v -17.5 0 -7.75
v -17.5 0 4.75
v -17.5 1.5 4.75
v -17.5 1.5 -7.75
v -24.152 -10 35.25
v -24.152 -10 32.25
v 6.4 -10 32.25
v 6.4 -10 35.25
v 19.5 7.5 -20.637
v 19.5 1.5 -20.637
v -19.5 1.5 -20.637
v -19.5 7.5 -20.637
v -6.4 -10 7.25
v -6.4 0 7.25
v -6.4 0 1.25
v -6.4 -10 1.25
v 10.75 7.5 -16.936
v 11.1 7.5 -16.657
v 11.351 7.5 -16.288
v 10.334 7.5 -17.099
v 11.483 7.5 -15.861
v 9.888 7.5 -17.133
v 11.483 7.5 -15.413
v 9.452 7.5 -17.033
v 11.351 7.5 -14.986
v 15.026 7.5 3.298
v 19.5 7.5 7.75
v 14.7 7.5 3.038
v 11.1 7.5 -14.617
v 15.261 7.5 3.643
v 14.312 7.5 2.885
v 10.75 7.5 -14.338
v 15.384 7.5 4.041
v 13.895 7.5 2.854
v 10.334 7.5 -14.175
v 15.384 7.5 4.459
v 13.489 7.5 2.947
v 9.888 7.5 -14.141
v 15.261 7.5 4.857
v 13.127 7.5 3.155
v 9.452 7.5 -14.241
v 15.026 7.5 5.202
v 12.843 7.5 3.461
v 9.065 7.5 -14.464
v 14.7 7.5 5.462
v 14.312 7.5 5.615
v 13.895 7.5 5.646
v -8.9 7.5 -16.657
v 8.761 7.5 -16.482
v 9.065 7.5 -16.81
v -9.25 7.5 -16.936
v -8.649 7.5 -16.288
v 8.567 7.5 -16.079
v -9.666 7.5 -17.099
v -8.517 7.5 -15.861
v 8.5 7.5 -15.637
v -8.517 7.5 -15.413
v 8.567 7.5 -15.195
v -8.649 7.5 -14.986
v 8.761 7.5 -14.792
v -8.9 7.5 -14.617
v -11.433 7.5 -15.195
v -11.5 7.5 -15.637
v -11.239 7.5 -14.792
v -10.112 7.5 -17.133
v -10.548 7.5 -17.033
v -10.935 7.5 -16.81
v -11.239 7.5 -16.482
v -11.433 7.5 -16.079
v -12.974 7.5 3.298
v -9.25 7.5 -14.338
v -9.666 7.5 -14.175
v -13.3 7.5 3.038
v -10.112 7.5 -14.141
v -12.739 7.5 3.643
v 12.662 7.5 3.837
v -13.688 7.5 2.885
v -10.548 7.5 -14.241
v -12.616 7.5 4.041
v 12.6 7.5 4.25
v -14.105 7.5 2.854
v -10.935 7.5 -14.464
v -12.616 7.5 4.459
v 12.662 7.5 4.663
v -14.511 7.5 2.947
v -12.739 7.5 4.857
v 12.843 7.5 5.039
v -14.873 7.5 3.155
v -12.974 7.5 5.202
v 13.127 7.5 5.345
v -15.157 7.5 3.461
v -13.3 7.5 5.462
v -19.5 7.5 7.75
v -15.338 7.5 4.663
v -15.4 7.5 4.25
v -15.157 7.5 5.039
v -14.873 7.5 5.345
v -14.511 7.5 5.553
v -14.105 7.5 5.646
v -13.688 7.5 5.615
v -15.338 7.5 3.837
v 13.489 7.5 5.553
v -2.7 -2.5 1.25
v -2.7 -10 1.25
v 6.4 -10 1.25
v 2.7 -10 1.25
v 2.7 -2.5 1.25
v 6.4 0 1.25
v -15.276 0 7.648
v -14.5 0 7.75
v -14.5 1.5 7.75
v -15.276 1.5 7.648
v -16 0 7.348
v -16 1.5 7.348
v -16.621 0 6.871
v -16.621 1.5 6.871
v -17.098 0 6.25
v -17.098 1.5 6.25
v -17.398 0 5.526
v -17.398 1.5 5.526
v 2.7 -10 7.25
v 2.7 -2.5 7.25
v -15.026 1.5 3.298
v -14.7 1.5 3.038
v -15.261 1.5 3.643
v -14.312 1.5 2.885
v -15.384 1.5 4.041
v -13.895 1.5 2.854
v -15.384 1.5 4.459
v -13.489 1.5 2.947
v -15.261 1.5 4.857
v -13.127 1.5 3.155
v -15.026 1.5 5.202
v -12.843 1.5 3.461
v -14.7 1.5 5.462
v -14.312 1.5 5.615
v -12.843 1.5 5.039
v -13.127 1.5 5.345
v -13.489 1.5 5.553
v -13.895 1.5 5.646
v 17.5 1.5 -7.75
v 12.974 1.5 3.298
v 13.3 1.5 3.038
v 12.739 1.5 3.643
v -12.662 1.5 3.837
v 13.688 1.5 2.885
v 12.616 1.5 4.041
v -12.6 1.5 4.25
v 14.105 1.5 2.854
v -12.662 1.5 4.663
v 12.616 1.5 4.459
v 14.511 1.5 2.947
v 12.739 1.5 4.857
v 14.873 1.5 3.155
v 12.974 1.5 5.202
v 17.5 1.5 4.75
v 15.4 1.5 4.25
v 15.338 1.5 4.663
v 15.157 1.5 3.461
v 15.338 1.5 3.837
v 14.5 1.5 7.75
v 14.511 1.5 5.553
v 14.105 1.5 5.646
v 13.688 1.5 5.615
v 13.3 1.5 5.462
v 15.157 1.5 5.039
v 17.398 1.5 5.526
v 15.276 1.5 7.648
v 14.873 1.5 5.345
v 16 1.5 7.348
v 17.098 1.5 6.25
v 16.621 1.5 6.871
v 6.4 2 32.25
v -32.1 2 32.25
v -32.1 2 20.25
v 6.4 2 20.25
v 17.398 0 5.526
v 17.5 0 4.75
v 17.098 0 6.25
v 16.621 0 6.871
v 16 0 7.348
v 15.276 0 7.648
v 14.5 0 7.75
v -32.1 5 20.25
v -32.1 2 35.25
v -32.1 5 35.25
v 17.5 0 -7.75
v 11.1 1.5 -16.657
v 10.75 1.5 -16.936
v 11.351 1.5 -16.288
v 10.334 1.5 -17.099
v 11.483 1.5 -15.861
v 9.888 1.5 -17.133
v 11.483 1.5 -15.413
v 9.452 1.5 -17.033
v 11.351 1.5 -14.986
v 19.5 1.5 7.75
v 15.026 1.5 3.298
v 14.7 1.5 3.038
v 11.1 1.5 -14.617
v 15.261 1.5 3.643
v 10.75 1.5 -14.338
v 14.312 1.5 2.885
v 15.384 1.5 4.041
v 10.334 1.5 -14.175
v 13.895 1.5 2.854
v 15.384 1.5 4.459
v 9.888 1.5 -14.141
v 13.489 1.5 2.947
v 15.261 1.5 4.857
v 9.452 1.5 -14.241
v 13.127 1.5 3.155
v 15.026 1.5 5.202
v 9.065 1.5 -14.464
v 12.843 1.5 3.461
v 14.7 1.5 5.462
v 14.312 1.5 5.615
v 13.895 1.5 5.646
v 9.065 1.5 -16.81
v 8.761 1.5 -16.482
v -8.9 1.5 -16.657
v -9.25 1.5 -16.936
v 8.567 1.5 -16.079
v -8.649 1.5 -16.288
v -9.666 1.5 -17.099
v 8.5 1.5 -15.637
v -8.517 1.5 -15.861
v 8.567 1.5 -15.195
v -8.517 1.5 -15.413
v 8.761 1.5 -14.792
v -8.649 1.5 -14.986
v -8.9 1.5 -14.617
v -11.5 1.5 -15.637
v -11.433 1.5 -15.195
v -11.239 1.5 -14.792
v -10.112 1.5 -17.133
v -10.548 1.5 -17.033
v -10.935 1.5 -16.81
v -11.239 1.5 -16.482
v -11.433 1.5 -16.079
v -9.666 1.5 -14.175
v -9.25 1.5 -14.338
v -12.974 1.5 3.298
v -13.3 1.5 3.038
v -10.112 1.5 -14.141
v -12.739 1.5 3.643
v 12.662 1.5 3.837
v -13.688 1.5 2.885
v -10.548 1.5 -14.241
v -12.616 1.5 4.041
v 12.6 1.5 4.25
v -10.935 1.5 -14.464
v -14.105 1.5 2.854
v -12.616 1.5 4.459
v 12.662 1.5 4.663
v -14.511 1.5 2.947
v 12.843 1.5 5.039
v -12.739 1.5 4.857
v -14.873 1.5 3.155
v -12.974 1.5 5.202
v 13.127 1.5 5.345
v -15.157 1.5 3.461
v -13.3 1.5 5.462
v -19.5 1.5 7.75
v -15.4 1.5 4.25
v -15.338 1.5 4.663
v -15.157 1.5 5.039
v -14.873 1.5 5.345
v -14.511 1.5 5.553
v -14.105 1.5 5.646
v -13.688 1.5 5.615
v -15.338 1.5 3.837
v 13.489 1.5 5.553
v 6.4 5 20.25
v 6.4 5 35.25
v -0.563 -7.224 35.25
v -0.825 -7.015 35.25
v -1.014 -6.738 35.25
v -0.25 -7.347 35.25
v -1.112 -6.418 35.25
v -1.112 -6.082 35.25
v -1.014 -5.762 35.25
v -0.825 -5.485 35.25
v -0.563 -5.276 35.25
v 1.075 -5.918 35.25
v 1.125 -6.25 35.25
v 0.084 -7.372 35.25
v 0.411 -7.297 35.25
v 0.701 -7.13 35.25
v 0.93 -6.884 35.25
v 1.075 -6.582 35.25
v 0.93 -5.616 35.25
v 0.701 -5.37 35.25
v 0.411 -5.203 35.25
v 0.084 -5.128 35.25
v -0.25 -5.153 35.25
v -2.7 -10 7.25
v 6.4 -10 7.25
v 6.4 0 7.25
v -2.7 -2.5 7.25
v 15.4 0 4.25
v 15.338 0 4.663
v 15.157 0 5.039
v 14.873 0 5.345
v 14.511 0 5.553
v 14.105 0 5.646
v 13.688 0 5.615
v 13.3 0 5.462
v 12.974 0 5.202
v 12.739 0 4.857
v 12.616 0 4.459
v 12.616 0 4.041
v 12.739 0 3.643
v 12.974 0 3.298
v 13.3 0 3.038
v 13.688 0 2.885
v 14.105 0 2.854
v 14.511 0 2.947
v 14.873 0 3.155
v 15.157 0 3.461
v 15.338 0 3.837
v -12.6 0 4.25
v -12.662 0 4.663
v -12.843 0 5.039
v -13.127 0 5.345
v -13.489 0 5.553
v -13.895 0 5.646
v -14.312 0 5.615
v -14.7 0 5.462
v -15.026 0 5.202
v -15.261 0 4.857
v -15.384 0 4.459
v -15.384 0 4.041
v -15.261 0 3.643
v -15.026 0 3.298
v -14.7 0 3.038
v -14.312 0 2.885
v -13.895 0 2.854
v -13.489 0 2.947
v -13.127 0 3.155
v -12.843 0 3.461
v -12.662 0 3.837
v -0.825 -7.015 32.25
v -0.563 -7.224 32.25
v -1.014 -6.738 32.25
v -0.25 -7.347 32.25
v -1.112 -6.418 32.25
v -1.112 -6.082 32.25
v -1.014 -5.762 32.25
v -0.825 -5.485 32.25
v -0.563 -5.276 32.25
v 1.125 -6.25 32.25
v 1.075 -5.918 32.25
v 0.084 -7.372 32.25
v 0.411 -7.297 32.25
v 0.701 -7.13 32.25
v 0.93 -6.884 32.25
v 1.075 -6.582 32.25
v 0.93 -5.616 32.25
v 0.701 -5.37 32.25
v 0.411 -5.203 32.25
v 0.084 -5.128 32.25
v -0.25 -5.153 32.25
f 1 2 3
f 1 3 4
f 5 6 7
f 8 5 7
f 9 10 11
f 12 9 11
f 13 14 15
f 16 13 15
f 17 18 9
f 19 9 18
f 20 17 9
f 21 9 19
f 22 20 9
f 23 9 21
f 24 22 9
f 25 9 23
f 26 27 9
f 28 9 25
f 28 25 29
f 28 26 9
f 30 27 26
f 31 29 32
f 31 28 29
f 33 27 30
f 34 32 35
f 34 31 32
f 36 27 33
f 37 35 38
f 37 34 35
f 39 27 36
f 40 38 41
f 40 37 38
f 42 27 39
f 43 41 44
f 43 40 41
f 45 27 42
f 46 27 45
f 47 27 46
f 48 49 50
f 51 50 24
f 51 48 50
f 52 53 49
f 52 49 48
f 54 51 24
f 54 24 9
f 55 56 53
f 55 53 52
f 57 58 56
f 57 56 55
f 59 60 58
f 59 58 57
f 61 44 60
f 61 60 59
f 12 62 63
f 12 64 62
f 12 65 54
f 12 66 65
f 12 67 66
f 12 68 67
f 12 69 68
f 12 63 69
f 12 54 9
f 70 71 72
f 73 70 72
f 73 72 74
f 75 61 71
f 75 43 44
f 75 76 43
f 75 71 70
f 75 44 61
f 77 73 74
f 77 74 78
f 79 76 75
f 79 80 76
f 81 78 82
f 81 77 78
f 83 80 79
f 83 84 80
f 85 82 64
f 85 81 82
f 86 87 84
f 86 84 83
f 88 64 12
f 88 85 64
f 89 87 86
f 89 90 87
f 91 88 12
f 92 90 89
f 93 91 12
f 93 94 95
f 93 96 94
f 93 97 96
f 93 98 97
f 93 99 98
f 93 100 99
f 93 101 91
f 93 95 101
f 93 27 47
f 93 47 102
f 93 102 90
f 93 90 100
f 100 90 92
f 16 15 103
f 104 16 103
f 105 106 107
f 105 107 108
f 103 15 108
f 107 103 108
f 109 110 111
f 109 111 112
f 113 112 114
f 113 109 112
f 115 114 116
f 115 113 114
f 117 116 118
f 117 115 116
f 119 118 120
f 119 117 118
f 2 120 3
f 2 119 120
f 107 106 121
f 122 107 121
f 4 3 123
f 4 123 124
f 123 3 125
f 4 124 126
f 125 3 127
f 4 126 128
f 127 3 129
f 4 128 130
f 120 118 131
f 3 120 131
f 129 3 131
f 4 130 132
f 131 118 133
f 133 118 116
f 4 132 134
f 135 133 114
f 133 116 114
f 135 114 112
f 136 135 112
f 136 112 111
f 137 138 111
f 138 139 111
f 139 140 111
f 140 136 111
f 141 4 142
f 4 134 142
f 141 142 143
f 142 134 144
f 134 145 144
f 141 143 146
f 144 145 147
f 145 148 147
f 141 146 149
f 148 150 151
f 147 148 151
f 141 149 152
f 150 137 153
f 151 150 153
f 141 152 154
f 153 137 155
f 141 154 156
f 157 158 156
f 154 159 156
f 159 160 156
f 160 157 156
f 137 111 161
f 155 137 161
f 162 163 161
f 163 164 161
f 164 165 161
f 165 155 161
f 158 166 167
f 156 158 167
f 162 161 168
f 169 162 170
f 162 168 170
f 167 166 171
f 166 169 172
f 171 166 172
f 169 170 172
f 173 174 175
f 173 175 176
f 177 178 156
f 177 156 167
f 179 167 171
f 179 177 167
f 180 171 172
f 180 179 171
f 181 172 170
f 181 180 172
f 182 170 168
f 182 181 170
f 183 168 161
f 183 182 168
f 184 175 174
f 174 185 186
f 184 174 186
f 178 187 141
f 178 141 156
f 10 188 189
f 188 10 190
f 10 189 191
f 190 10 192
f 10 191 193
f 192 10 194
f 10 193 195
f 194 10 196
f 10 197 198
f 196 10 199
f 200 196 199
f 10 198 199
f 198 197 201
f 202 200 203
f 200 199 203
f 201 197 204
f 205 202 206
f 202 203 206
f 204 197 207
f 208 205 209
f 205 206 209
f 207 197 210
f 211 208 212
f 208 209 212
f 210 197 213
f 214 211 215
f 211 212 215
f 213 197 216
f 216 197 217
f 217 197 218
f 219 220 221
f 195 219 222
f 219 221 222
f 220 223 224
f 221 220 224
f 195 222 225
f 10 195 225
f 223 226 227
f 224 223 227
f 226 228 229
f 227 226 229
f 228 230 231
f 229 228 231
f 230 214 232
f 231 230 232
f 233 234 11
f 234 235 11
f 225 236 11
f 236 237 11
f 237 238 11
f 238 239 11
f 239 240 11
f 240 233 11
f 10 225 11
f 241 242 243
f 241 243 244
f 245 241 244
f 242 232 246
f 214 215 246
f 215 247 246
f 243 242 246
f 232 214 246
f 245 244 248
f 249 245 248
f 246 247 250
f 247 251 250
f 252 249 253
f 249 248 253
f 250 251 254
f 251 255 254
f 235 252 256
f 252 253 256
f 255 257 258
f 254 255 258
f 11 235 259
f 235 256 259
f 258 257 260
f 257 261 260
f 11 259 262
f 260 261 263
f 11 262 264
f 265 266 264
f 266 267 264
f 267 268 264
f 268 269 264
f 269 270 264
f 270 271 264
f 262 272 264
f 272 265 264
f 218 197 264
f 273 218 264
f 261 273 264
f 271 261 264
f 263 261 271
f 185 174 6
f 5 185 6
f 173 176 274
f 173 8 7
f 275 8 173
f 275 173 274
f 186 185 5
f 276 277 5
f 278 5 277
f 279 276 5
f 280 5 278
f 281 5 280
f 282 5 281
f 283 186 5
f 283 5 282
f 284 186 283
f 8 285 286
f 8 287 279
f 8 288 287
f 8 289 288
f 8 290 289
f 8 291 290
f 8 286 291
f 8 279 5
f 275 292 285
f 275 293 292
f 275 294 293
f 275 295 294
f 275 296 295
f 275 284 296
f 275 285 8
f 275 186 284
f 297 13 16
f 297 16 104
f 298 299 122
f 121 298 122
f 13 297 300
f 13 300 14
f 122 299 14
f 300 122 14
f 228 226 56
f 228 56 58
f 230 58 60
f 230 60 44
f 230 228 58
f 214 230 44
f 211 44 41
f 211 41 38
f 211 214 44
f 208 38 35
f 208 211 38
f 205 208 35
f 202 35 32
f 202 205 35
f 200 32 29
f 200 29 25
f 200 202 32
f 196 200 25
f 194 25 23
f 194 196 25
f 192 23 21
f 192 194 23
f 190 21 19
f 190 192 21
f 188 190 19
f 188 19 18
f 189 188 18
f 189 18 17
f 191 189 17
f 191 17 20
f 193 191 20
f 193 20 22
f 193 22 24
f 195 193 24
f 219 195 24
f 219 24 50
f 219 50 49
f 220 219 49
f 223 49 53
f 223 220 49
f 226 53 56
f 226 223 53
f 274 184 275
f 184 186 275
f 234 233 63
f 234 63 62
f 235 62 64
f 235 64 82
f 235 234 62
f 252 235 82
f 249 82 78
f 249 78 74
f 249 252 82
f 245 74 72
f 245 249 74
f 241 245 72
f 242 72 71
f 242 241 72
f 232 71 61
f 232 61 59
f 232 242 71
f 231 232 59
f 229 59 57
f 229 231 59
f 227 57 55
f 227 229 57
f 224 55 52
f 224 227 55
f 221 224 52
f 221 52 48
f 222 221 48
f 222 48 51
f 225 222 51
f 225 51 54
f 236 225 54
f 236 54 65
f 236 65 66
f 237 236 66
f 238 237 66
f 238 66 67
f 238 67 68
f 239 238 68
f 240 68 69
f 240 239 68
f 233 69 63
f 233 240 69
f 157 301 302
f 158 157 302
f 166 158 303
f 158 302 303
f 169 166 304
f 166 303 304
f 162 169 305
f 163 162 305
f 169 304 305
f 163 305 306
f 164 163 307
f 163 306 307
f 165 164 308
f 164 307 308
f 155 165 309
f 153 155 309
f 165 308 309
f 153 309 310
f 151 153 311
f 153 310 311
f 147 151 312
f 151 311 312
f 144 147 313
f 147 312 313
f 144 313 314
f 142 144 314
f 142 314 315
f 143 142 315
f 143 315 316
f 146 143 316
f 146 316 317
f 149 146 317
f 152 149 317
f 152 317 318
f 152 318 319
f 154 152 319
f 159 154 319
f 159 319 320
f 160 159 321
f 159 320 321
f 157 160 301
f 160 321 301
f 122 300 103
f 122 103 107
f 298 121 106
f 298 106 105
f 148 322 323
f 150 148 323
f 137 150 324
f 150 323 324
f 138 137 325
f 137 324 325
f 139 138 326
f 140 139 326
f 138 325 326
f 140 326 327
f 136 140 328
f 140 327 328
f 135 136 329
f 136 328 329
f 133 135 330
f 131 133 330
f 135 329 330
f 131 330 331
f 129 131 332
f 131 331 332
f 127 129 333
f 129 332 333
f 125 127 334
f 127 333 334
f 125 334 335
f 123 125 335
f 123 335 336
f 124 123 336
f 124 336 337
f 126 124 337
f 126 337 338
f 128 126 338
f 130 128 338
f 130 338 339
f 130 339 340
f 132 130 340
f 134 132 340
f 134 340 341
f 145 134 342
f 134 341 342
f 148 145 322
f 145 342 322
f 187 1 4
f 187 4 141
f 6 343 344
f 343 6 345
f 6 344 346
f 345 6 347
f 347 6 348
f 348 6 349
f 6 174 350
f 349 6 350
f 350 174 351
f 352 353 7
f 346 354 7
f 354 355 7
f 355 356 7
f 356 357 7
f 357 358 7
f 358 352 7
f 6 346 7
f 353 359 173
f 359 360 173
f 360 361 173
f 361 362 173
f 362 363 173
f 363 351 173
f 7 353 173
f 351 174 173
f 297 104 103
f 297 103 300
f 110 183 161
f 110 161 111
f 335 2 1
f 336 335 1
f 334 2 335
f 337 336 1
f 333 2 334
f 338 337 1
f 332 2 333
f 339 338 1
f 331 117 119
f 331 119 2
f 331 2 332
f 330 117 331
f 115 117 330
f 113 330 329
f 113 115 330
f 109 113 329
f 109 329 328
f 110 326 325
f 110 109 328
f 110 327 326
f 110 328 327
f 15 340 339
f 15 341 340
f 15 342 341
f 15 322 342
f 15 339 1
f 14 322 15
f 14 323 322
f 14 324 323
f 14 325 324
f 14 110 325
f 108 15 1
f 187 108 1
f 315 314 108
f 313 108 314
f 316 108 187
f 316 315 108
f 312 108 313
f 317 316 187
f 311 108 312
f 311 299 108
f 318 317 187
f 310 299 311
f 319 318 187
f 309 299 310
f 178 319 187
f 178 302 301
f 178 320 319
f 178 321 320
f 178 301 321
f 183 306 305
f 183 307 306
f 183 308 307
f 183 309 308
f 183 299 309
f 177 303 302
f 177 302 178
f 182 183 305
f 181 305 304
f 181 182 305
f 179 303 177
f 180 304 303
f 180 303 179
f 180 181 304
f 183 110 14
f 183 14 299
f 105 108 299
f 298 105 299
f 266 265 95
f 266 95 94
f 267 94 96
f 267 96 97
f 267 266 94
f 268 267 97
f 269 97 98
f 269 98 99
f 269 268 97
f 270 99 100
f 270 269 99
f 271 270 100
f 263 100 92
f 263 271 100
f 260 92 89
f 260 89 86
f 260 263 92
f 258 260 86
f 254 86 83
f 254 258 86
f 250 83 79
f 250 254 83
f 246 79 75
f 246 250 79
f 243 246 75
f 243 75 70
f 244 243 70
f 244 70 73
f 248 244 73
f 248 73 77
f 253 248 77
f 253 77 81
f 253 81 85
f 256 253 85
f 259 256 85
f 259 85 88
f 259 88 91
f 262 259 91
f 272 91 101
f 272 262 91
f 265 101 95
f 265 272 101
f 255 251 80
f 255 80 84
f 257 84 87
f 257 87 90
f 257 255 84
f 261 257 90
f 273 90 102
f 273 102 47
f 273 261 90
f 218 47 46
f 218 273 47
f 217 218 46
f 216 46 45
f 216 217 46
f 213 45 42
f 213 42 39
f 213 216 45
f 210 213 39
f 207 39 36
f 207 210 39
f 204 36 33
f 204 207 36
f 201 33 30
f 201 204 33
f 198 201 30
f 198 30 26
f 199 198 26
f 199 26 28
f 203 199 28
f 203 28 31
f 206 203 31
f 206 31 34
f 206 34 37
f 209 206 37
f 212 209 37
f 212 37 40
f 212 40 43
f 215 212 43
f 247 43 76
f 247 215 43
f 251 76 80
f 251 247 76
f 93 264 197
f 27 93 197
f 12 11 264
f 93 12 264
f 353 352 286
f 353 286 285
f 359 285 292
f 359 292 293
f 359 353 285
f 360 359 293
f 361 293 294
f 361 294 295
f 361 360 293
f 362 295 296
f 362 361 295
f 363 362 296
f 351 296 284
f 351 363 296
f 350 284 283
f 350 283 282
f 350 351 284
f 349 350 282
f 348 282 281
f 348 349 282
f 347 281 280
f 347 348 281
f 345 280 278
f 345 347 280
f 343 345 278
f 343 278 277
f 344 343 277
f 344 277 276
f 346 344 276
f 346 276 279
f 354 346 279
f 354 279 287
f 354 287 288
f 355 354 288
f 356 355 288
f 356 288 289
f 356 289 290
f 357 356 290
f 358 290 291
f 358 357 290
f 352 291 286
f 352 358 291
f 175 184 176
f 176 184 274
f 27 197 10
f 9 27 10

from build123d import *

# Parameters (mm, degrees)
F0_R      = 1.4
F1_DEPTH  = 1.5
F2_DEPTH  = 10
F3_W      = 5.4
F3_H      = 6
F4_DEPTH  = 7.5
F6_R      = 1.125
F6_W      = 38.5
F6_H      = 3
F7_DEPTH  = 3
F8_DEPTH  = 12
F9_R      = 1.5
F9_R_2    = 1.4
F10_DEPTH = 6


with BuildPart() as f1:
    # F0 (on Front) → F1 (new body)
    with BuildSketch(Plane.XZ):
        with BuildLine():
            ThreePointArc((17.5, 4.75), (16.6213203436, 6.8713203436), (14.5, 7.75))
            Line((14.5, 7.75), (-14.5, 7.75))
            ThreePointArc((-14.5, 7.75), (-16.6213203436, 6.8713203436), (-17.5, 4.75))
            Line((-17.5, 4.75), (-17.5, -7.75))
            Line((-17.5, -7.75), (17.5, -7.75))
            Line((17.5, -7.75), (17.5, 4.75))
        make_face()
        with Locations((-14, 4.25)):
            Circle(F0_R, mode=Mode.SUBTRACT)
        Polygon((6.4, 1.25), (-6.4, 1.25), (-6.4, 4.25), (-6.4, 7.25), (6.4, 7.25), (6.4, 4.25), align=None, mode=Mode.SUBTRACT)
        with Locations((14, 4.25)):
            Circle(F0_R, mode=Mode.SUBTRACT)
        Polygon((-6.4, 4.25), (-6.4, 1.25), (6.4, 1.25), (6.4, 4.25), (6.4, 7.25), (-6.4, 7.25), align=None)
    extrude(amount=-F1_DEPTH)

    # F0 (on Front) → F2 (join)
    with BuildSketch(Plane.XZ):
        Polygon((-6.4, 4.25), (-6.4, 1.25), (6.4, 1.25), (6.4, 4.25), (6.4, 7.25), (-6.4, 7.25), align=None)
    extrude(amount=F2_DEPTH)

    # F3 (on face) → F4 (cut)
    with BuildSketch(Plane.XZ.offset(10)):
        with Locations((0, 4.25)):
            Rectangle(F3_W, F3_H)
    extrude(amount=-F4_DEPTH, mode=Mode.SUBTRACT)


with BuildPart() as f7:
    # F6 (on offset) → F7 (new body)
    with BuildSketch(Plane.XY.offset(32.25)):
        Polygon((-24.1516847163, -10), (6.4, -10), (6.4, 2), (-32.1, 2), align=None)
        with Locations((0, -6.25)):
            Circle(F6_R, mode=Mode.SUBTRACT)
        with Locations((-12.85, 3.5)):
            Rectangle(F6_W, F6_H)
    extrude(amount=F7_DEPTH)

    # F6 (on offset) → F8 (join)
    with BuildSketch(Plane.XY.offset(32.25)):
        with Locations((-12.85, 3.5)):
            Rectangle(F6_W, F6_H)
    extrude(amount=-F8_DEPTH)


with BuildPart() as f10:
    # F9 (on face) → F10 (new body)
    with BuildSketch(Plane(origin=(0, 1.5, 0), x_dir=(-1, 0, 0), z_dir=(0, 1, 0))):
        with BuildLine():
            Line((17.5, -7.75), (-17.5, -7.75))
            Line((-17.5, -7.75), (-17.5, 4.75))
            ThreePointArc((-17.5, 4.75), (-16.6213203436, 6.8713203436), (-14.5, 7.75))
            Line((-14.5, 7.75), (-19.5, 7.75))
            Line((-19.5, 7.75), (-19.5, -7.75))
            Line((-19.5, -7.75), (-19.5, -20.6370297819))
            Line((-19.5, -20.6370297819), (19.5, -20.6370297819))
            Line((19.5, -20.6370297819), (19.5, -7.75))
            Line((19.5, -7.75), (19.5, 7.75))
            Line((19.5, 7.75), (14.5, 7.75))
            ThreePointArc((14.5, 7.75), (16.6213203436, 6.8713203436), (17.5, 4.75))
            Line((17.5, 4.75), (17.5, -7.75))
        make_face()
        with Locations((-10, -15.6370297819)):
            Circle(F9_R, mode=Mode.SUBTRACT)
        with Locations((10, -15.6370297819)):
            Circle(F9_R, mode=Mode.SUBTRACT)
        with BuildLine():
            Line((-17.5, 4.75), (-17.5, -7.75))
            Line((-17.5, -7.75), (17.5, -7.75))
            Line((17.5, -7.75), (17.5, 4.75))
            ThreePointArc((17.5, 4.75), (16.6213203436, 6.8713203436), (14.5, 7.75))
            Line((14.5, 7.75), (-14.5, 7.75))
            ThreePointArc((-14.5, 7.75), (-16.6213203436, 6.8713203436), (-17.5, 4.75))
        make_face()
        with Locations((-14, 4.25)):
            Circle(F9_R_2, mode=Mode.SUBTRACT)
        with Locations((14, 4.25)):
            Circle(F9_R_2, mode=Mode.SUBTRACT)
    extrude(amount=F10_DEPTH)


solid = Compound([f1.part, f7.part, f10.part])
